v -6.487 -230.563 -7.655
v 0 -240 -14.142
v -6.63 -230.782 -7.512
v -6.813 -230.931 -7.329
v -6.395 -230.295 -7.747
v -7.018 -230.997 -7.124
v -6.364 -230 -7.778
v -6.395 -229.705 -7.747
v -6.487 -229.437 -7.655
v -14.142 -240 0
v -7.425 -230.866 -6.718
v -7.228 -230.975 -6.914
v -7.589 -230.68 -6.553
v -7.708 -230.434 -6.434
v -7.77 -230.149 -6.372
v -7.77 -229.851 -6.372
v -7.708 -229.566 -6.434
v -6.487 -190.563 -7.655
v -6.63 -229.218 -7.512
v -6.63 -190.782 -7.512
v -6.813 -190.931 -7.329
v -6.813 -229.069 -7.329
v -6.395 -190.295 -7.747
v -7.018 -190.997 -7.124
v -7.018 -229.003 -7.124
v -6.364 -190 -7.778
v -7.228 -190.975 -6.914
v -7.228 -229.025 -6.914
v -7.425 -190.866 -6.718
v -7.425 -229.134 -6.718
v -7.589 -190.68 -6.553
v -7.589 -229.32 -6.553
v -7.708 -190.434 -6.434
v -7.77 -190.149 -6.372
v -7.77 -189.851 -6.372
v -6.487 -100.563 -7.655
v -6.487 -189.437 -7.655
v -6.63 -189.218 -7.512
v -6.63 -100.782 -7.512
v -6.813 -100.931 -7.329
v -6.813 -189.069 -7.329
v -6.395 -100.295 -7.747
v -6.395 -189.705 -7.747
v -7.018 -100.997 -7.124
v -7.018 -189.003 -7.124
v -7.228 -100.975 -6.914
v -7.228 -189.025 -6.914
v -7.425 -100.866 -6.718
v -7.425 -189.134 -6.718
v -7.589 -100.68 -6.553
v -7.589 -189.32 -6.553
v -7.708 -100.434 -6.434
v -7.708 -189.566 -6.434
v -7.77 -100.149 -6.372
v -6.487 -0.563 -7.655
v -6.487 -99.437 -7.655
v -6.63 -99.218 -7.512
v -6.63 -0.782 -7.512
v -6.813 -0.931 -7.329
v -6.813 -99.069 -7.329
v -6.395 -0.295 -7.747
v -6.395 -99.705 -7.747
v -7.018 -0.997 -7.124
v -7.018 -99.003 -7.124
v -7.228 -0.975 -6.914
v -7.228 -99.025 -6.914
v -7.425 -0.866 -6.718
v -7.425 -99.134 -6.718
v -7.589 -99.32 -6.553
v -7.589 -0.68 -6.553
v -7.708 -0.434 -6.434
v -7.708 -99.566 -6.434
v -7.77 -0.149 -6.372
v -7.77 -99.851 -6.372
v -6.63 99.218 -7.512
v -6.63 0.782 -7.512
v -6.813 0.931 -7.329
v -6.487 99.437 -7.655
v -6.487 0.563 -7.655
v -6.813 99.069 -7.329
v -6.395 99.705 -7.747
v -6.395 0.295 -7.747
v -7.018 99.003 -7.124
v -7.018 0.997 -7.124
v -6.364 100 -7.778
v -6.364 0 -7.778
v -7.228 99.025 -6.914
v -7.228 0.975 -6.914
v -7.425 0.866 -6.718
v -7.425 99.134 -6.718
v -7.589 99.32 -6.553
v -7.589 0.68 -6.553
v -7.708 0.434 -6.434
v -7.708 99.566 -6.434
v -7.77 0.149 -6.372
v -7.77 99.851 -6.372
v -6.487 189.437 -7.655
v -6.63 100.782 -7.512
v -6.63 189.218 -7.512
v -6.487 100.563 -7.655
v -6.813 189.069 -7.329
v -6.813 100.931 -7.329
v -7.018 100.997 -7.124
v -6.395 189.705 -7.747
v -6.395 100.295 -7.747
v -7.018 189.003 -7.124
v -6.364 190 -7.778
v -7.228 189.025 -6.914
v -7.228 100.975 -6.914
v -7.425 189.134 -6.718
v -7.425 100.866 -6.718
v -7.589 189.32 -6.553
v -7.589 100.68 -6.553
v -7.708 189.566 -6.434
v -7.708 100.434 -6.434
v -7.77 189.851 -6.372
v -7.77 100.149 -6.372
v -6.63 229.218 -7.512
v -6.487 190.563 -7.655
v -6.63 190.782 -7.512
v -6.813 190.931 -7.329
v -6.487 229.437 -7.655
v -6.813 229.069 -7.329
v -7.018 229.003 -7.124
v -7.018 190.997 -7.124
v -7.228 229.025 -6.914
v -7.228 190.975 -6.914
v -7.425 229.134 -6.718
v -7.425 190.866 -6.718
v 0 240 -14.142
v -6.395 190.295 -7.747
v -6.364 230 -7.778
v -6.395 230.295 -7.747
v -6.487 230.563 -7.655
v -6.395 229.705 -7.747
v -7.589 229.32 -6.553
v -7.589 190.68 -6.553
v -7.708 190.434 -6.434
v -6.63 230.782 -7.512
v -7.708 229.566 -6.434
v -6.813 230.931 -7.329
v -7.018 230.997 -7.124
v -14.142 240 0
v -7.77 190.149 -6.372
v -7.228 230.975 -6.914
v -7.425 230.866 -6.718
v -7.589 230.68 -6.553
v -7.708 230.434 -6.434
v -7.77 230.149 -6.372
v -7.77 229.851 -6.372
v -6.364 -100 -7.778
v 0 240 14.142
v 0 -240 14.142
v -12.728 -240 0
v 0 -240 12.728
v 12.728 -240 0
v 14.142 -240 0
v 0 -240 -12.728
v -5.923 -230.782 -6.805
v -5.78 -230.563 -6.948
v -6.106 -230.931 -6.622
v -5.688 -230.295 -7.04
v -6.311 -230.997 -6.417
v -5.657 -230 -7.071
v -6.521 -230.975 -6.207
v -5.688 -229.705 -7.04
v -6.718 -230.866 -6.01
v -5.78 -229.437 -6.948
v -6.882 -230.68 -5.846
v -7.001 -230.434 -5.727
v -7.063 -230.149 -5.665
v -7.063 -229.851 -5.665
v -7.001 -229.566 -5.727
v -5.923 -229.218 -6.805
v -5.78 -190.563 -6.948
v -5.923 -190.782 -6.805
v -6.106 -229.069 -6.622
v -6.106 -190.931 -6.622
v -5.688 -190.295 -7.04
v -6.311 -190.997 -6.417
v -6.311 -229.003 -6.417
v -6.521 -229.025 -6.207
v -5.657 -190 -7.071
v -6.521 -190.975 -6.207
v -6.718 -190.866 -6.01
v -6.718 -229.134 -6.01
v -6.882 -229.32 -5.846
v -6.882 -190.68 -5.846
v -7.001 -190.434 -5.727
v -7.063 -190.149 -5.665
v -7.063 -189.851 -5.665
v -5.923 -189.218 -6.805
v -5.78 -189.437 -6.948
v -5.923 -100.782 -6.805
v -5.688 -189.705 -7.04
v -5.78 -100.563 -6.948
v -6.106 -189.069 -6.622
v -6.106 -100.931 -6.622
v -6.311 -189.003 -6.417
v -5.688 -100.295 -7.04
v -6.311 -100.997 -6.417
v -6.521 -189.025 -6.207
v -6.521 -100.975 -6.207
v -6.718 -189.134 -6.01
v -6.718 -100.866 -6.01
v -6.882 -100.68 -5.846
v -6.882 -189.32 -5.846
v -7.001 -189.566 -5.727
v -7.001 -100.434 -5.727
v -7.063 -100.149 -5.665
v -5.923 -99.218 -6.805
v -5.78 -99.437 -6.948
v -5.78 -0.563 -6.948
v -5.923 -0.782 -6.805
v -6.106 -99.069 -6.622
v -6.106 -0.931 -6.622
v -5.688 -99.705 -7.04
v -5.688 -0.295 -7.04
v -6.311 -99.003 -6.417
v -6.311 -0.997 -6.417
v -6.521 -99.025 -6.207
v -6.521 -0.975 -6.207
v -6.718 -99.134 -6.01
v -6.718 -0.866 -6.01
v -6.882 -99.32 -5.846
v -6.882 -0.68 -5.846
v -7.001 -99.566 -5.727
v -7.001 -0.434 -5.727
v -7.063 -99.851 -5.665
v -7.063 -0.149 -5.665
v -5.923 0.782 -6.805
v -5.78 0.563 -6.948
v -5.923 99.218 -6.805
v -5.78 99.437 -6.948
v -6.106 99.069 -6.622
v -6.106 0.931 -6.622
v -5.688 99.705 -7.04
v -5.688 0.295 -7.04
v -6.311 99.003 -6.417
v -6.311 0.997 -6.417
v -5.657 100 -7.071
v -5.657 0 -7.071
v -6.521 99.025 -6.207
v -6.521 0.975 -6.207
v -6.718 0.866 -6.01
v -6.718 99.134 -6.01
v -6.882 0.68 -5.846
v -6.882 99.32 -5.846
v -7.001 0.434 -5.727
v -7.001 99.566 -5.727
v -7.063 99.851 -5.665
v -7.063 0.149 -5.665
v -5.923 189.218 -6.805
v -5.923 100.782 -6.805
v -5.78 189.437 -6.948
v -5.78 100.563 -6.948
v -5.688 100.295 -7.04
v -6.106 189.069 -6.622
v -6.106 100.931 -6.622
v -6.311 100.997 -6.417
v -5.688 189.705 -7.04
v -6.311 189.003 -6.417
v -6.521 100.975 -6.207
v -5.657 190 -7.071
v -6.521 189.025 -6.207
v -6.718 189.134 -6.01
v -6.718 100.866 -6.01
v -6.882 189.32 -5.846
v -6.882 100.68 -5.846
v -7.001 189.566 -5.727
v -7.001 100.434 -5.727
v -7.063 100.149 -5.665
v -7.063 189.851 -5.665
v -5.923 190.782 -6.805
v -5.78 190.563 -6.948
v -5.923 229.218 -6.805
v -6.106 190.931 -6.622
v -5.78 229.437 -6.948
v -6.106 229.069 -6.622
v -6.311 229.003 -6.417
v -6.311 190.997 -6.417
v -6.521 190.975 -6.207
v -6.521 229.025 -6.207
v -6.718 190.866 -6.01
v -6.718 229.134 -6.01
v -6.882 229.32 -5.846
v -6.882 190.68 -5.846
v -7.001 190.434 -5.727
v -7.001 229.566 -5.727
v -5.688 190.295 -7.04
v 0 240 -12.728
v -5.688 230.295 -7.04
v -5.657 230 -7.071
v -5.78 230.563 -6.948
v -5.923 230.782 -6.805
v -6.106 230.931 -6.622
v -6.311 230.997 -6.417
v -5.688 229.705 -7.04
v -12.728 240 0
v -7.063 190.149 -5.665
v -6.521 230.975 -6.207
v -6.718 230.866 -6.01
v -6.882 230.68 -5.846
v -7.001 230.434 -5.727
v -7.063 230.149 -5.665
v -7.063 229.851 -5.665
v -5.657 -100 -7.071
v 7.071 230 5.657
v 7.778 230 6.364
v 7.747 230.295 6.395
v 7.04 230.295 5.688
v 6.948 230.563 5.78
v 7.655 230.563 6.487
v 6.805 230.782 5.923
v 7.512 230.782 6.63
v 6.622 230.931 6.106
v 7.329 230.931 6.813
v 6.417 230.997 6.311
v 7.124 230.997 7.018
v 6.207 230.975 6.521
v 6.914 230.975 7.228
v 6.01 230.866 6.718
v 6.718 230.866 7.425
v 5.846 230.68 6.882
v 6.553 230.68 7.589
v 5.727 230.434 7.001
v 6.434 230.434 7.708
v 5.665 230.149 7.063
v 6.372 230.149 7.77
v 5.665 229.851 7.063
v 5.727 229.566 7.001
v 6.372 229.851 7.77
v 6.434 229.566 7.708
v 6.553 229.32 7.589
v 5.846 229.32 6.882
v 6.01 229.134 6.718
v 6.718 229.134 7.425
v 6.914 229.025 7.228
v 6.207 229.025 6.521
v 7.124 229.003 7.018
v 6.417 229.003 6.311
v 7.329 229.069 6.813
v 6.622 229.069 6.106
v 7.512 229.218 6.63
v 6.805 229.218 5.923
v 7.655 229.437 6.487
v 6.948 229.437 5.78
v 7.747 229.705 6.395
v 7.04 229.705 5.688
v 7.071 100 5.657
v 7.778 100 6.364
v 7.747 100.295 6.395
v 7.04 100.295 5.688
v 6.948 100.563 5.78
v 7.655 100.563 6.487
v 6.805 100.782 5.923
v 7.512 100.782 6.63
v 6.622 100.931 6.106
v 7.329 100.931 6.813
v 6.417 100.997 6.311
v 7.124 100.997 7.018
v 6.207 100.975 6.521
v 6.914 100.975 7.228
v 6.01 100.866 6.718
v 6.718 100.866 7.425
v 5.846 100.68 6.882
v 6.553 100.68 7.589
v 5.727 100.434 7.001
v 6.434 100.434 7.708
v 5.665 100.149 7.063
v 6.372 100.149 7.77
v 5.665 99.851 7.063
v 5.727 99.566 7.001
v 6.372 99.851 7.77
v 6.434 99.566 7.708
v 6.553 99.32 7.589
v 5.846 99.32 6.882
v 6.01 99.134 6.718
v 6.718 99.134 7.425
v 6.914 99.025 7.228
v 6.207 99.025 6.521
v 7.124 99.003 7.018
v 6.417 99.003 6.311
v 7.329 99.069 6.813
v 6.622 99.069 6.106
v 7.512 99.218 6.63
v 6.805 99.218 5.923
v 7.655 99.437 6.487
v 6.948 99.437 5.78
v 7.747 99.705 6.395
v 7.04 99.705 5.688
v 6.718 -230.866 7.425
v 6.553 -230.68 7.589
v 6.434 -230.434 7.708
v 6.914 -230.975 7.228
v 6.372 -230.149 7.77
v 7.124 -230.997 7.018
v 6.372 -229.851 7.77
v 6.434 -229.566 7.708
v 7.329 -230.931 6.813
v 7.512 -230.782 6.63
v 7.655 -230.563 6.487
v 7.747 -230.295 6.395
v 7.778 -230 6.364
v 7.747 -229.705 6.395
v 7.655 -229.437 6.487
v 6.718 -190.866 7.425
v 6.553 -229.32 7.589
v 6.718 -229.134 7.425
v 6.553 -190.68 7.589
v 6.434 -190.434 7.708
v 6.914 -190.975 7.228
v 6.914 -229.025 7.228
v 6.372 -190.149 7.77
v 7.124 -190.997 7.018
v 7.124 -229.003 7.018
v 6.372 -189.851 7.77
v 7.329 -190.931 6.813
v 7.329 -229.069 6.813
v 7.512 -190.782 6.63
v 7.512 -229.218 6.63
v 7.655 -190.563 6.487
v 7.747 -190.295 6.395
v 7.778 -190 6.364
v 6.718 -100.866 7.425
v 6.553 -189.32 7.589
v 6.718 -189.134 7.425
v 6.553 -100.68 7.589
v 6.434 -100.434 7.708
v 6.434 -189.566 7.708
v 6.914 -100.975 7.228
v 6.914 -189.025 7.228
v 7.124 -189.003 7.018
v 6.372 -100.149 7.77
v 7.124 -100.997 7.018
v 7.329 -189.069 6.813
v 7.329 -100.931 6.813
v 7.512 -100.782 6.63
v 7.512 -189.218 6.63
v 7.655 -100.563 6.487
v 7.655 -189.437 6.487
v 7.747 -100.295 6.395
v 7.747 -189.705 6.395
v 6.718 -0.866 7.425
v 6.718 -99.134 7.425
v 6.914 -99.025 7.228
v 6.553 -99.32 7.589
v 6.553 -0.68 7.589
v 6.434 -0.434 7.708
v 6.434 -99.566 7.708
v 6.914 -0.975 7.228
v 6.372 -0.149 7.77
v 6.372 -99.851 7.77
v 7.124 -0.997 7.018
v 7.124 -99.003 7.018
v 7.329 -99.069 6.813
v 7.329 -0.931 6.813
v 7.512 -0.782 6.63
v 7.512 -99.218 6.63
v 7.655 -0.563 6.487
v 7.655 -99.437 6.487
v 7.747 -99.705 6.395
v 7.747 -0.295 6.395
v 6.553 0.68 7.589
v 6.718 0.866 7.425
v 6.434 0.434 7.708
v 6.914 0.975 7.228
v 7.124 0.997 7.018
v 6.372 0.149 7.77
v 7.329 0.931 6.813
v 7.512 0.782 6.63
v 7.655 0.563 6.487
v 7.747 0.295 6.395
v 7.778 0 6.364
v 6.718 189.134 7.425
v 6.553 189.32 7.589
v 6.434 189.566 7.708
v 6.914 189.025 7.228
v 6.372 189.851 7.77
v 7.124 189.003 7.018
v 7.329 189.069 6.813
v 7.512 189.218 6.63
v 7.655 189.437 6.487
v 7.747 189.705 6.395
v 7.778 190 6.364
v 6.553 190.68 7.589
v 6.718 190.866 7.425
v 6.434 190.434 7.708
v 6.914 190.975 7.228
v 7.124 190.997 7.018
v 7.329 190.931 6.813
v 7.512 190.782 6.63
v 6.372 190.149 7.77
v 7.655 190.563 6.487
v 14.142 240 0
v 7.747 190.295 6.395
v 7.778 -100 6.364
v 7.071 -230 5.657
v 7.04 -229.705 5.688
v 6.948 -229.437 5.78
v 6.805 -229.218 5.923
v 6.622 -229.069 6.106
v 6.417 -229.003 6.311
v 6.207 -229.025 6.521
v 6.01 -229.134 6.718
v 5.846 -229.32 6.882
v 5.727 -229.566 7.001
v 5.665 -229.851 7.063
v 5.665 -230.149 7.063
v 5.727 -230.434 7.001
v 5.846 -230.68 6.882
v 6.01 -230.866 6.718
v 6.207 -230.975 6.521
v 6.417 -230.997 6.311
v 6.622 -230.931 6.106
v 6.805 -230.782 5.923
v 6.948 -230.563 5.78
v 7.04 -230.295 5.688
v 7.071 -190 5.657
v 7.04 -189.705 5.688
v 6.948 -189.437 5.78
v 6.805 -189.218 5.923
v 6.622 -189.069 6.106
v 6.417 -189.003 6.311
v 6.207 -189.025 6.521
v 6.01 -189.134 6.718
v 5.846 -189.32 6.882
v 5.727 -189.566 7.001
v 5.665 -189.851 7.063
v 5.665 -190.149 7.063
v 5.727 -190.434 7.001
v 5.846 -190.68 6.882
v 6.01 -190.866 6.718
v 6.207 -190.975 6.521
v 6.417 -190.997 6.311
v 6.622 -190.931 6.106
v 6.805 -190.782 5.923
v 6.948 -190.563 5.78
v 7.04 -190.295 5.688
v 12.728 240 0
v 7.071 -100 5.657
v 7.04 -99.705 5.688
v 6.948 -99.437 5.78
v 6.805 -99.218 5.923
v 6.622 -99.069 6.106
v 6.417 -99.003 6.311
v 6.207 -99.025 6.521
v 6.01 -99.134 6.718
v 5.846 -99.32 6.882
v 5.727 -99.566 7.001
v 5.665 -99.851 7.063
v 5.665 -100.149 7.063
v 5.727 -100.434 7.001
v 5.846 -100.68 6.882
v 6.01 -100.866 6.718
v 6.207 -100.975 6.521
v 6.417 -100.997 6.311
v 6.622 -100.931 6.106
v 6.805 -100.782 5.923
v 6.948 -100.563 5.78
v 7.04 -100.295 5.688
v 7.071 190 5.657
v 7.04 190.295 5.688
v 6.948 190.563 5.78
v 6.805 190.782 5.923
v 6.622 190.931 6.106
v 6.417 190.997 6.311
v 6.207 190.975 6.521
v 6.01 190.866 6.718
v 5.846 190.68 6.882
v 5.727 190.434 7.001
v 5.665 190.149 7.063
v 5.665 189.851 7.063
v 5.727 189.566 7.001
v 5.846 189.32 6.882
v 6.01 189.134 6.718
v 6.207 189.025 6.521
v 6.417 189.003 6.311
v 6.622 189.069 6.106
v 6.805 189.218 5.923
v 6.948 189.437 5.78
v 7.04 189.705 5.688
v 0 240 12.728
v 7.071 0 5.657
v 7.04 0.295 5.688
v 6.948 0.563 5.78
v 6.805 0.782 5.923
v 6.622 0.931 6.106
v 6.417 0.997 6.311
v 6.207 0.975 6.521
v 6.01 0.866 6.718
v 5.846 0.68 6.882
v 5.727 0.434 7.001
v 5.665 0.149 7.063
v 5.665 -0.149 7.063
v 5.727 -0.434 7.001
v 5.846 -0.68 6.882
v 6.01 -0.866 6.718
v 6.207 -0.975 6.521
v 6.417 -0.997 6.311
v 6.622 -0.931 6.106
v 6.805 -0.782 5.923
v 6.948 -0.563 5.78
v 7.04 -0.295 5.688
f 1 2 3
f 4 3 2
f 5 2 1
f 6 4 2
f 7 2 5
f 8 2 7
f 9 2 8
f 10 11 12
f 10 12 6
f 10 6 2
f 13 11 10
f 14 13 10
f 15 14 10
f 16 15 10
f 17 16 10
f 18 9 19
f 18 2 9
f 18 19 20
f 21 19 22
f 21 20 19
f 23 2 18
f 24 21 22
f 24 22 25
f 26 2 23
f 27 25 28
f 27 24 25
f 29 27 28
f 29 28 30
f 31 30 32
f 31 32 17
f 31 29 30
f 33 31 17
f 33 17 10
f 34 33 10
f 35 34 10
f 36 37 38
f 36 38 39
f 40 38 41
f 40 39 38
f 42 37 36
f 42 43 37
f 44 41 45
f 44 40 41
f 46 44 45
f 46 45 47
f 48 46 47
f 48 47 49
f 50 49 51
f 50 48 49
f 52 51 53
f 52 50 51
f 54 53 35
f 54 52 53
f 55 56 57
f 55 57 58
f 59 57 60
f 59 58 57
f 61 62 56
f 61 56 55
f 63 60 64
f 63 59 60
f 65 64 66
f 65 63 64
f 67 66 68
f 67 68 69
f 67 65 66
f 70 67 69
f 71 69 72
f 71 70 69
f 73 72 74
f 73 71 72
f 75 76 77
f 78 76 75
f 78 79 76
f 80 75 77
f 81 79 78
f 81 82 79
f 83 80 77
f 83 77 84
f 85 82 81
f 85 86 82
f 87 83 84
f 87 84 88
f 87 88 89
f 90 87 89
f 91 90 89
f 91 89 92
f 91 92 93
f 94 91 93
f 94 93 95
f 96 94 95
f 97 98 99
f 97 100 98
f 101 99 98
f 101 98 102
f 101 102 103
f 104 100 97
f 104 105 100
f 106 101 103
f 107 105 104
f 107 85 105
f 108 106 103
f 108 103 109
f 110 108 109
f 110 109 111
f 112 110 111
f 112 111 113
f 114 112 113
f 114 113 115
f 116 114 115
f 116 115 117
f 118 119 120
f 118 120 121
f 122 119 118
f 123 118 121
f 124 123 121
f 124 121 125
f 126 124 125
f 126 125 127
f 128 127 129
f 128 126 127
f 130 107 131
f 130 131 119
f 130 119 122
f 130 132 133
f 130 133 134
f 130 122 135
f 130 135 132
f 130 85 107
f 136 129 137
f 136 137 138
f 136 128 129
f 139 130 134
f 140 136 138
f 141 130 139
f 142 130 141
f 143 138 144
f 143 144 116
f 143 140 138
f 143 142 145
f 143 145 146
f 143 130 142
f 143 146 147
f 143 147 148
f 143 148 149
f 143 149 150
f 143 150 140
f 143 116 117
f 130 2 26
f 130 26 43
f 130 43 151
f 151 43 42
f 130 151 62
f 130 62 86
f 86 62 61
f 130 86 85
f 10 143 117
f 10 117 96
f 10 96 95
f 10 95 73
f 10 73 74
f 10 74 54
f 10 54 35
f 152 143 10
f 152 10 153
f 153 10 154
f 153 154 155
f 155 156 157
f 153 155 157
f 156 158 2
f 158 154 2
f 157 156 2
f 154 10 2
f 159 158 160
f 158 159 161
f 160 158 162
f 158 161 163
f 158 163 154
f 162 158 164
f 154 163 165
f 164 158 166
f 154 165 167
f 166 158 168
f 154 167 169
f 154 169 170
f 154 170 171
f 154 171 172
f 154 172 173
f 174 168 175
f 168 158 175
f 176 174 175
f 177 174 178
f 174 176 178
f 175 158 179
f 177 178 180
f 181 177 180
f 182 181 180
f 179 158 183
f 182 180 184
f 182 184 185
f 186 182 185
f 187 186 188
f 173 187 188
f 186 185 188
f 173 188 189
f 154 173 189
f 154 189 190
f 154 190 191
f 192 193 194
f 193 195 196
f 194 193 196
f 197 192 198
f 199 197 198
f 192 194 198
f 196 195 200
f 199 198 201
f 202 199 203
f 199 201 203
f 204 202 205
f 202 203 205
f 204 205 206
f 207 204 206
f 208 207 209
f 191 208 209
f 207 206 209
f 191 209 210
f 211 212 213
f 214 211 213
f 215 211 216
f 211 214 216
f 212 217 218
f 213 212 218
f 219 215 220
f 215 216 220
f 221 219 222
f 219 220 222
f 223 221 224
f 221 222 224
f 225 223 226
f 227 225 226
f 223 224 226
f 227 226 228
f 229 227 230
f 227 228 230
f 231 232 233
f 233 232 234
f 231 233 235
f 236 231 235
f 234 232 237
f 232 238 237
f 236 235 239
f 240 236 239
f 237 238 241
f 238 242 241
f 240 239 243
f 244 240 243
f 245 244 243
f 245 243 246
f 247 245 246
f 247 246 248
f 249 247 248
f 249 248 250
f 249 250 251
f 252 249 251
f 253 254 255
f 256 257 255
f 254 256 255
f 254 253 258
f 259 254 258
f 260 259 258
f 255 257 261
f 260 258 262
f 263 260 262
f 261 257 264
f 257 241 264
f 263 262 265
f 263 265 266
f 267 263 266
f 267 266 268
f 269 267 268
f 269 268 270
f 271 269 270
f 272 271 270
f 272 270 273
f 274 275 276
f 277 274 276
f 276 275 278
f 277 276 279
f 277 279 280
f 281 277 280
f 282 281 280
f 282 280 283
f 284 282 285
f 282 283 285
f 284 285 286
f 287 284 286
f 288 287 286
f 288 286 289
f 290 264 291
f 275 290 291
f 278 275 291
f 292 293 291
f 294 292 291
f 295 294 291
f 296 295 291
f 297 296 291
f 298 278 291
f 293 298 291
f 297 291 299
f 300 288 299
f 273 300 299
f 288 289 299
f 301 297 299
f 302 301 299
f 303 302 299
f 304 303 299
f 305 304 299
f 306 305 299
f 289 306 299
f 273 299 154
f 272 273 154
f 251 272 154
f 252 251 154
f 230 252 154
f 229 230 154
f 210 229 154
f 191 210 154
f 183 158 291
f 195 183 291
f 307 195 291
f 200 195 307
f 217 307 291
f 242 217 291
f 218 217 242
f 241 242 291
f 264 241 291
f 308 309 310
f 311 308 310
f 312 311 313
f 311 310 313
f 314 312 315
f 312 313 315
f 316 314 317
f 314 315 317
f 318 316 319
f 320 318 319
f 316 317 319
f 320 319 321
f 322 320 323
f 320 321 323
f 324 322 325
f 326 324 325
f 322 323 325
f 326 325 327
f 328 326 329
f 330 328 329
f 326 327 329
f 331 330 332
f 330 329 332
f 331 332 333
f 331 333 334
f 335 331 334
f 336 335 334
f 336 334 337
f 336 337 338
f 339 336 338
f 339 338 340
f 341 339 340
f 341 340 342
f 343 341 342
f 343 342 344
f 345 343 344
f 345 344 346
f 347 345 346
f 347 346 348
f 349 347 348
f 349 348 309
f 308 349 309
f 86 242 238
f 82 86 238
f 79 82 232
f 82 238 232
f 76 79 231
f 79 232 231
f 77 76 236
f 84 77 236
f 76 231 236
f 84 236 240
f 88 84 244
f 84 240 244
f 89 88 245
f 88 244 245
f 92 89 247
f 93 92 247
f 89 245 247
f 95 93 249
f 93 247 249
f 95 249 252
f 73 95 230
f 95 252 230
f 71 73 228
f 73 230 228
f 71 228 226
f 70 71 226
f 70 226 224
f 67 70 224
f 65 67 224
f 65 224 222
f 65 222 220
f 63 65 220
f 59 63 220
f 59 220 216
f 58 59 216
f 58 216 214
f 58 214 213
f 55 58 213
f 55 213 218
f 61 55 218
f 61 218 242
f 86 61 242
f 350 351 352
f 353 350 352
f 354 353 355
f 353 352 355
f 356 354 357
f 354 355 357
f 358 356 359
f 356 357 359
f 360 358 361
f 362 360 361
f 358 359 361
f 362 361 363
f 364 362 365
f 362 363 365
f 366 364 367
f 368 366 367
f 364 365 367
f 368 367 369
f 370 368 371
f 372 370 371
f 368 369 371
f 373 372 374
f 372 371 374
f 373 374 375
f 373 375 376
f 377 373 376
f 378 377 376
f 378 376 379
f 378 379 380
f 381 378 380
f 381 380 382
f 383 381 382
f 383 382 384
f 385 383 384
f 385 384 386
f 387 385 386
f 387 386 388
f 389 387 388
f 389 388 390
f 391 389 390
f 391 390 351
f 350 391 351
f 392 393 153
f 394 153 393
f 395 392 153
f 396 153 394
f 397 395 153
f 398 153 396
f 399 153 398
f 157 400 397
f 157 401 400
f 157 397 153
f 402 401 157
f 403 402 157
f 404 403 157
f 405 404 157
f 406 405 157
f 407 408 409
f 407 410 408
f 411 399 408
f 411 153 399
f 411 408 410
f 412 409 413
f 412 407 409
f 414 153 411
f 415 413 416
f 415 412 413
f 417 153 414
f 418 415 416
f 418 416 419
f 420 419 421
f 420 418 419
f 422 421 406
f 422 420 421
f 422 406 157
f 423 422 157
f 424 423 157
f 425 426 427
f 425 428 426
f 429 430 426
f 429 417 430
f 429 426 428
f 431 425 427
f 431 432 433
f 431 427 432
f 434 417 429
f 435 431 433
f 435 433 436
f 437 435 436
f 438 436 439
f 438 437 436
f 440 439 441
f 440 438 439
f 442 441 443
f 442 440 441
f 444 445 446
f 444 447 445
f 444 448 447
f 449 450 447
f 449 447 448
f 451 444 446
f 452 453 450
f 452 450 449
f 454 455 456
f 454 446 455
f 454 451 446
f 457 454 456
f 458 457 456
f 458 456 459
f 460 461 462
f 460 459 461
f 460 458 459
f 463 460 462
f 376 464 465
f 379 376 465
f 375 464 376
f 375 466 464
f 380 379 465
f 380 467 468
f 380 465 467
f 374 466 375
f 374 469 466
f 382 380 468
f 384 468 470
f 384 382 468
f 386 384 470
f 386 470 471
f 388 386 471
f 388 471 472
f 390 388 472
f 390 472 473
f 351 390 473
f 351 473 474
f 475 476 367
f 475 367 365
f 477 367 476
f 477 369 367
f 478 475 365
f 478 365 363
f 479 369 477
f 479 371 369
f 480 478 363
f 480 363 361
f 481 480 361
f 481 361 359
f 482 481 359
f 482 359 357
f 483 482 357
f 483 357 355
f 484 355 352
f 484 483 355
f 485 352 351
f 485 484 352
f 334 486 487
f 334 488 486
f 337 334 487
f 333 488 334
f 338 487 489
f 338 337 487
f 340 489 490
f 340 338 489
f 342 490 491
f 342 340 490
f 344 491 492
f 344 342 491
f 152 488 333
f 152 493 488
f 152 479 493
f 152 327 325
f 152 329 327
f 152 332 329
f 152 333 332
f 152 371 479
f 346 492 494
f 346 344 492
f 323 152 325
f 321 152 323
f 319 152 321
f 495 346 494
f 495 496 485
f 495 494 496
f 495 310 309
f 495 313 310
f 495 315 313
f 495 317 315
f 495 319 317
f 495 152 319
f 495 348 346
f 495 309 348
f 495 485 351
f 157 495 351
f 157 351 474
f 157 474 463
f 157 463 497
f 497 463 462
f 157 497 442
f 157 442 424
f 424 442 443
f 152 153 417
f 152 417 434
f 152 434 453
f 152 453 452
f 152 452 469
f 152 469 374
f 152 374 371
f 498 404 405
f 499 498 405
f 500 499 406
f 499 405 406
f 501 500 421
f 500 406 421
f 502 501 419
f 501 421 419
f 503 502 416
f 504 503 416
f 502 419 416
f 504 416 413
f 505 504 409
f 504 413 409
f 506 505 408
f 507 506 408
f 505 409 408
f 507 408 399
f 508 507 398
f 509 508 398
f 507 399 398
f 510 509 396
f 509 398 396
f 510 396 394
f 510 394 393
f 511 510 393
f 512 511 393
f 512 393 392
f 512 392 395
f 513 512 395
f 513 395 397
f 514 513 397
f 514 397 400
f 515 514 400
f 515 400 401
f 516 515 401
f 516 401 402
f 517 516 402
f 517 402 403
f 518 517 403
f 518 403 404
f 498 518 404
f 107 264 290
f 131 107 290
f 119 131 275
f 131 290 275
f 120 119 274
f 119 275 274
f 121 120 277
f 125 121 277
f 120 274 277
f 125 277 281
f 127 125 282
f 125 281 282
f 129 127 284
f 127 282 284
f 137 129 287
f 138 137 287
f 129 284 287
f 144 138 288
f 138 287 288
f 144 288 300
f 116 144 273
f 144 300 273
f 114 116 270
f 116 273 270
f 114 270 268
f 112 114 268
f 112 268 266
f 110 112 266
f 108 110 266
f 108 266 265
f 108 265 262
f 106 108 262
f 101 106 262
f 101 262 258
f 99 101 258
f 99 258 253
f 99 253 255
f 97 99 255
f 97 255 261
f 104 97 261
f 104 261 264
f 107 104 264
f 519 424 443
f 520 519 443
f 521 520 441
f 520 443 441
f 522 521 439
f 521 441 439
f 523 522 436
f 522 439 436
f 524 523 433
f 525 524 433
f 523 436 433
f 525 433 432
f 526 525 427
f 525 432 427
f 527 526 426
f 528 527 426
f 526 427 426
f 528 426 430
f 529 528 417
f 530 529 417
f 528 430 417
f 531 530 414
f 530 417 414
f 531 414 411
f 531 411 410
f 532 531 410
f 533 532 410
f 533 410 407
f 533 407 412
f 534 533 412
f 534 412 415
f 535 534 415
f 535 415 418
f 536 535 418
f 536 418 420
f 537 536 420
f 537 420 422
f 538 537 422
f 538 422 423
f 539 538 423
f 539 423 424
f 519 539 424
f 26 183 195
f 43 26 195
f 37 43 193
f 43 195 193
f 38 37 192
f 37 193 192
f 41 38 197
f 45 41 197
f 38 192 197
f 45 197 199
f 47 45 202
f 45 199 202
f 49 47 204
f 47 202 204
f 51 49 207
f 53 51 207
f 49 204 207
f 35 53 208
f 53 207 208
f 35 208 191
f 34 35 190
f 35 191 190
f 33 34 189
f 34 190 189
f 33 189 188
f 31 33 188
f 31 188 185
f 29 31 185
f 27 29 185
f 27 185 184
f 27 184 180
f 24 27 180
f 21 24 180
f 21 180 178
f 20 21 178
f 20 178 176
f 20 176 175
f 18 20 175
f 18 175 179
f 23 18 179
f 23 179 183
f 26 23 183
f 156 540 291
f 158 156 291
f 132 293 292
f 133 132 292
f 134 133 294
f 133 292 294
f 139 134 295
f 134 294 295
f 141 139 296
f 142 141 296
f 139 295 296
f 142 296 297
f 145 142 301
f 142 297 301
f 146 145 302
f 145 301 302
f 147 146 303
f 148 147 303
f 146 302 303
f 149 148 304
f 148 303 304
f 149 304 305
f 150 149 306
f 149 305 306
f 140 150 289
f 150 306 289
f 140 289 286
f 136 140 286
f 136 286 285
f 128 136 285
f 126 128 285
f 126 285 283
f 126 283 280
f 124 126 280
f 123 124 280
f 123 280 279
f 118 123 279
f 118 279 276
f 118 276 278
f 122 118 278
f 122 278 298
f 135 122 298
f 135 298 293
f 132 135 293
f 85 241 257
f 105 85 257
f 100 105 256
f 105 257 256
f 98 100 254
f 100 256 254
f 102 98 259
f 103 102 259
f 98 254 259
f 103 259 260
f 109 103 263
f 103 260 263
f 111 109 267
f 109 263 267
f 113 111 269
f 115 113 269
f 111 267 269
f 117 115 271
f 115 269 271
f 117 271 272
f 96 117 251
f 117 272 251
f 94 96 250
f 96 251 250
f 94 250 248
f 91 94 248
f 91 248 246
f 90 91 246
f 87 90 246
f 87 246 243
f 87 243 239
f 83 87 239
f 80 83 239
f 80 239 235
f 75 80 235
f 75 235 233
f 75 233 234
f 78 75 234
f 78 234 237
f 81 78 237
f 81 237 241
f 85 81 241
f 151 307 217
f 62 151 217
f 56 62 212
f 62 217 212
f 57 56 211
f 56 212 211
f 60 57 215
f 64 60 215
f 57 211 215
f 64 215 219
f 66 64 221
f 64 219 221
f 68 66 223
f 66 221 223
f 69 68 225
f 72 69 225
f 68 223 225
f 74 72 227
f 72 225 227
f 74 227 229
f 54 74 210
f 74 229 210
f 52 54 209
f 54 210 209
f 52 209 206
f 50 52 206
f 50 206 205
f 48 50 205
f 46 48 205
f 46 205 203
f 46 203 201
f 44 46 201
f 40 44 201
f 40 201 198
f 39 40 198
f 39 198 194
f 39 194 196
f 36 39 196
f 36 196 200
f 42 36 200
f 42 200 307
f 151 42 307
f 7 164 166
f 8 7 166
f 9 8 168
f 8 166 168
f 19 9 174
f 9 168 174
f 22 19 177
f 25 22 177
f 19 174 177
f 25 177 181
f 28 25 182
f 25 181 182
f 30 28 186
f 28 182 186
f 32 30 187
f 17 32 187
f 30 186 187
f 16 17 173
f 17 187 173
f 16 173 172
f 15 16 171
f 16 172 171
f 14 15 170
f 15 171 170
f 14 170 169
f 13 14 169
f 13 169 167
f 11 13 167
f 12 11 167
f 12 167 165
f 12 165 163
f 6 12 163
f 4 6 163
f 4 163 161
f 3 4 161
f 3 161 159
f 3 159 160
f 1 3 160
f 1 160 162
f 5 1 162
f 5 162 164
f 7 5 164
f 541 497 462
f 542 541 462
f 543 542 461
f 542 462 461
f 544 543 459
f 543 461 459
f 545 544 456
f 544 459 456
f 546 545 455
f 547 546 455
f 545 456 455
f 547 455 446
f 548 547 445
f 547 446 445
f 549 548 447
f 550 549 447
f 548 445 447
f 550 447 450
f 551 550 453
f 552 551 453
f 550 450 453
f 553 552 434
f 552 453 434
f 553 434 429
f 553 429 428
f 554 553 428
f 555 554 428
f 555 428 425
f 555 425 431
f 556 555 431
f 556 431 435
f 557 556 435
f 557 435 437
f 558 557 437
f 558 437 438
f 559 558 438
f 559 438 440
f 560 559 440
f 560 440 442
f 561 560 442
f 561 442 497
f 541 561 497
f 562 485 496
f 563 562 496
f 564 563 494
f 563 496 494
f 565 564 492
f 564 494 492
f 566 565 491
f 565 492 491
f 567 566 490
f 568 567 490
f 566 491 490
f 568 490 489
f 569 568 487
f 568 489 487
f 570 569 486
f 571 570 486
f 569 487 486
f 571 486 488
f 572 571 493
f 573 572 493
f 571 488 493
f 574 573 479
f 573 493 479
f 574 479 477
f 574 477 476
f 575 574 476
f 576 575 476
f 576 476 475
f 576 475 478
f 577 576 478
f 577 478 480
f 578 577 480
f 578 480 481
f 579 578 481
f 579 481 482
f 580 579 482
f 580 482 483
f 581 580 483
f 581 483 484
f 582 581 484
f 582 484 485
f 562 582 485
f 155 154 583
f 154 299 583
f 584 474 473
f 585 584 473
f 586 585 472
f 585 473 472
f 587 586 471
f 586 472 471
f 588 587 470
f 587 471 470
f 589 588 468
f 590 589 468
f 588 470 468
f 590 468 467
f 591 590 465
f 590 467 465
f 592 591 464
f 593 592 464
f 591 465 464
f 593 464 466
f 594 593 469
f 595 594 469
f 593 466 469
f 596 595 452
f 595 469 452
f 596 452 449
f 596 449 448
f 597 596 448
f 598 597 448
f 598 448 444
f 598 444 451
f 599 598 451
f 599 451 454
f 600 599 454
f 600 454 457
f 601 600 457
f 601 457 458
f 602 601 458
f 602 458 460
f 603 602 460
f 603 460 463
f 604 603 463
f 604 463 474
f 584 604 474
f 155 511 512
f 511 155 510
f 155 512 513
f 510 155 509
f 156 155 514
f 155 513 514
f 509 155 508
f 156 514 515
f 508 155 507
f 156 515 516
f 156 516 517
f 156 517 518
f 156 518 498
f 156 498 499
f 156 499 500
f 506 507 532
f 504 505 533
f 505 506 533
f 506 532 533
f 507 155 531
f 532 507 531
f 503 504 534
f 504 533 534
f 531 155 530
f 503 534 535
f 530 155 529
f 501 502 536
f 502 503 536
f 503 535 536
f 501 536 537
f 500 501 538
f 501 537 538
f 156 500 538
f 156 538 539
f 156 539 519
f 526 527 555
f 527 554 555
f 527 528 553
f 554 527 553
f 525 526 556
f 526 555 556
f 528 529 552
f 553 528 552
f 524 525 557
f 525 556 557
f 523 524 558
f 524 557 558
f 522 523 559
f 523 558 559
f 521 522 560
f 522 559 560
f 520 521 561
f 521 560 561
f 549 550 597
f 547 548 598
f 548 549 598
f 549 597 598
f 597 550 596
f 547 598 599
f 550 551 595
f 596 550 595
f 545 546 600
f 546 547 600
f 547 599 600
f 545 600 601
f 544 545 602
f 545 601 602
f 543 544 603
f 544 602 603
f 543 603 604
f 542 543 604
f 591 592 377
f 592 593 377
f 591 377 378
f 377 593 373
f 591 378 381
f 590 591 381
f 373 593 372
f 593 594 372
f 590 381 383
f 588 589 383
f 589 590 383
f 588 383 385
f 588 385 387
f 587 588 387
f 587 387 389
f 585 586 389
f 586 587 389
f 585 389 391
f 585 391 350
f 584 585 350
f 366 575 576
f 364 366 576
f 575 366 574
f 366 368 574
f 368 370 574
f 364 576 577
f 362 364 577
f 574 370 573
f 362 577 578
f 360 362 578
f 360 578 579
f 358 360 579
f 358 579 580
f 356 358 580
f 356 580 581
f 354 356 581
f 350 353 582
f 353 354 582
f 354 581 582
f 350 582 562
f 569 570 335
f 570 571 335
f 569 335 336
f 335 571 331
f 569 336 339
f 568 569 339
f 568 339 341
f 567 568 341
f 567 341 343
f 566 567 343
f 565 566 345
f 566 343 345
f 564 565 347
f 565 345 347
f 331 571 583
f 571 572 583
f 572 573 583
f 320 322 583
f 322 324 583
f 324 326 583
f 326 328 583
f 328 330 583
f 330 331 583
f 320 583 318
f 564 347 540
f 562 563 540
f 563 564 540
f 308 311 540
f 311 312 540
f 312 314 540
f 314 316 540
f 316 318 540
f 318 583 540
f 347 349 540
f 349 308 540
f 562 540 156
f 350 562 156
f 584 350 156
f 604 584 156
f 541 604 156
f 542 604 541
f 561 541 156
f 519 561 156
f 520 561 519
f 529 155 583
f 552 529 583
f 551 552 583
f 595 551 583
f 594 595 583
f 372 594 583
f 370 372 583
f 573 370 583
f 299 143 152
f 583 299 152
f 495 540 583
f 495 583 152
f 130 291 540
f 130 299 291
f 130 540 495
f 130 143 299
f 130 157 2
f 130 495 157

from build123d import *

# Parameters (mm, degrees)
EXTRUDE_1_DEPTH     = 240
SKETCH_3_R          = 1
CUT_EXTRUDE_1_DEPTH = 31
SKETCH_4_R          = 1
CUT_EXTRUDE_2_DEPTH = 31


with BuildPart() as part:
    # 草图1 → 凸台-拉伸1 (new body, symmetric)
    with BuildSketch(Plane(origin=(0, 0, 0), x_dir=(1, 0, 0), z_dir=(0, 1, 0))):
        Polygon((14.142135624, 0), (0, 14.142135624), (-14.142135624, 0), (0, -14.142135624), align=None)
        Polygon((12.727922061, 0), (0, 12.727922061), (-12.727922061, 0), (0, -12.727922061), align=None, mode=Mode.SUBTRACT)
    extrude(amount=EXTRUDE_1_DEPTH, both=True)

    # 草图3 → 切除-拉伸1 (cut, through all)
    with BuildSketch(Plane(origin=(7.071067812, 0, 7.071067812), x_dir=(0.707106781, 0, -0.707106781), z_dir=(0.707106781, 0, 0.707106781))):
        with Locations((0, 230)):
            Circle(SKETCH_3_R)
        with Locations((0, 190)):
            Circle(SKETCH_3_R)
        with Locations((0, -190)):
            Circle(SKETCH_3_R)
        with Locations((0, -230)):
            Circle(SKETCH_3_R)
    extrude(amount=-CUT_EXTRUDE_1_DEPTH, mode=Mode.SUBTRACT)

    # 草图4 → 切除-拉伸2 (cut, through all)
    with BuildSketch(Plane(origin=(7.071067812, 0, 7.071067812), x_dir=(0.707106781, 0, -0.707106781), z_dir=(0.707106781, 0, 0.707106781))):
        with Locations((0, 100)):
            Circle(SKETCH_4_R)
        Circle(SKETCH_4_R)
        with Locations((0, -100)):
            Circle(SKETCH_4_R)
    extrude(amount=-CUT_EXTRUDE_2_DEPTH, mode=Mode.SUBTRACT)


solid = part.part
